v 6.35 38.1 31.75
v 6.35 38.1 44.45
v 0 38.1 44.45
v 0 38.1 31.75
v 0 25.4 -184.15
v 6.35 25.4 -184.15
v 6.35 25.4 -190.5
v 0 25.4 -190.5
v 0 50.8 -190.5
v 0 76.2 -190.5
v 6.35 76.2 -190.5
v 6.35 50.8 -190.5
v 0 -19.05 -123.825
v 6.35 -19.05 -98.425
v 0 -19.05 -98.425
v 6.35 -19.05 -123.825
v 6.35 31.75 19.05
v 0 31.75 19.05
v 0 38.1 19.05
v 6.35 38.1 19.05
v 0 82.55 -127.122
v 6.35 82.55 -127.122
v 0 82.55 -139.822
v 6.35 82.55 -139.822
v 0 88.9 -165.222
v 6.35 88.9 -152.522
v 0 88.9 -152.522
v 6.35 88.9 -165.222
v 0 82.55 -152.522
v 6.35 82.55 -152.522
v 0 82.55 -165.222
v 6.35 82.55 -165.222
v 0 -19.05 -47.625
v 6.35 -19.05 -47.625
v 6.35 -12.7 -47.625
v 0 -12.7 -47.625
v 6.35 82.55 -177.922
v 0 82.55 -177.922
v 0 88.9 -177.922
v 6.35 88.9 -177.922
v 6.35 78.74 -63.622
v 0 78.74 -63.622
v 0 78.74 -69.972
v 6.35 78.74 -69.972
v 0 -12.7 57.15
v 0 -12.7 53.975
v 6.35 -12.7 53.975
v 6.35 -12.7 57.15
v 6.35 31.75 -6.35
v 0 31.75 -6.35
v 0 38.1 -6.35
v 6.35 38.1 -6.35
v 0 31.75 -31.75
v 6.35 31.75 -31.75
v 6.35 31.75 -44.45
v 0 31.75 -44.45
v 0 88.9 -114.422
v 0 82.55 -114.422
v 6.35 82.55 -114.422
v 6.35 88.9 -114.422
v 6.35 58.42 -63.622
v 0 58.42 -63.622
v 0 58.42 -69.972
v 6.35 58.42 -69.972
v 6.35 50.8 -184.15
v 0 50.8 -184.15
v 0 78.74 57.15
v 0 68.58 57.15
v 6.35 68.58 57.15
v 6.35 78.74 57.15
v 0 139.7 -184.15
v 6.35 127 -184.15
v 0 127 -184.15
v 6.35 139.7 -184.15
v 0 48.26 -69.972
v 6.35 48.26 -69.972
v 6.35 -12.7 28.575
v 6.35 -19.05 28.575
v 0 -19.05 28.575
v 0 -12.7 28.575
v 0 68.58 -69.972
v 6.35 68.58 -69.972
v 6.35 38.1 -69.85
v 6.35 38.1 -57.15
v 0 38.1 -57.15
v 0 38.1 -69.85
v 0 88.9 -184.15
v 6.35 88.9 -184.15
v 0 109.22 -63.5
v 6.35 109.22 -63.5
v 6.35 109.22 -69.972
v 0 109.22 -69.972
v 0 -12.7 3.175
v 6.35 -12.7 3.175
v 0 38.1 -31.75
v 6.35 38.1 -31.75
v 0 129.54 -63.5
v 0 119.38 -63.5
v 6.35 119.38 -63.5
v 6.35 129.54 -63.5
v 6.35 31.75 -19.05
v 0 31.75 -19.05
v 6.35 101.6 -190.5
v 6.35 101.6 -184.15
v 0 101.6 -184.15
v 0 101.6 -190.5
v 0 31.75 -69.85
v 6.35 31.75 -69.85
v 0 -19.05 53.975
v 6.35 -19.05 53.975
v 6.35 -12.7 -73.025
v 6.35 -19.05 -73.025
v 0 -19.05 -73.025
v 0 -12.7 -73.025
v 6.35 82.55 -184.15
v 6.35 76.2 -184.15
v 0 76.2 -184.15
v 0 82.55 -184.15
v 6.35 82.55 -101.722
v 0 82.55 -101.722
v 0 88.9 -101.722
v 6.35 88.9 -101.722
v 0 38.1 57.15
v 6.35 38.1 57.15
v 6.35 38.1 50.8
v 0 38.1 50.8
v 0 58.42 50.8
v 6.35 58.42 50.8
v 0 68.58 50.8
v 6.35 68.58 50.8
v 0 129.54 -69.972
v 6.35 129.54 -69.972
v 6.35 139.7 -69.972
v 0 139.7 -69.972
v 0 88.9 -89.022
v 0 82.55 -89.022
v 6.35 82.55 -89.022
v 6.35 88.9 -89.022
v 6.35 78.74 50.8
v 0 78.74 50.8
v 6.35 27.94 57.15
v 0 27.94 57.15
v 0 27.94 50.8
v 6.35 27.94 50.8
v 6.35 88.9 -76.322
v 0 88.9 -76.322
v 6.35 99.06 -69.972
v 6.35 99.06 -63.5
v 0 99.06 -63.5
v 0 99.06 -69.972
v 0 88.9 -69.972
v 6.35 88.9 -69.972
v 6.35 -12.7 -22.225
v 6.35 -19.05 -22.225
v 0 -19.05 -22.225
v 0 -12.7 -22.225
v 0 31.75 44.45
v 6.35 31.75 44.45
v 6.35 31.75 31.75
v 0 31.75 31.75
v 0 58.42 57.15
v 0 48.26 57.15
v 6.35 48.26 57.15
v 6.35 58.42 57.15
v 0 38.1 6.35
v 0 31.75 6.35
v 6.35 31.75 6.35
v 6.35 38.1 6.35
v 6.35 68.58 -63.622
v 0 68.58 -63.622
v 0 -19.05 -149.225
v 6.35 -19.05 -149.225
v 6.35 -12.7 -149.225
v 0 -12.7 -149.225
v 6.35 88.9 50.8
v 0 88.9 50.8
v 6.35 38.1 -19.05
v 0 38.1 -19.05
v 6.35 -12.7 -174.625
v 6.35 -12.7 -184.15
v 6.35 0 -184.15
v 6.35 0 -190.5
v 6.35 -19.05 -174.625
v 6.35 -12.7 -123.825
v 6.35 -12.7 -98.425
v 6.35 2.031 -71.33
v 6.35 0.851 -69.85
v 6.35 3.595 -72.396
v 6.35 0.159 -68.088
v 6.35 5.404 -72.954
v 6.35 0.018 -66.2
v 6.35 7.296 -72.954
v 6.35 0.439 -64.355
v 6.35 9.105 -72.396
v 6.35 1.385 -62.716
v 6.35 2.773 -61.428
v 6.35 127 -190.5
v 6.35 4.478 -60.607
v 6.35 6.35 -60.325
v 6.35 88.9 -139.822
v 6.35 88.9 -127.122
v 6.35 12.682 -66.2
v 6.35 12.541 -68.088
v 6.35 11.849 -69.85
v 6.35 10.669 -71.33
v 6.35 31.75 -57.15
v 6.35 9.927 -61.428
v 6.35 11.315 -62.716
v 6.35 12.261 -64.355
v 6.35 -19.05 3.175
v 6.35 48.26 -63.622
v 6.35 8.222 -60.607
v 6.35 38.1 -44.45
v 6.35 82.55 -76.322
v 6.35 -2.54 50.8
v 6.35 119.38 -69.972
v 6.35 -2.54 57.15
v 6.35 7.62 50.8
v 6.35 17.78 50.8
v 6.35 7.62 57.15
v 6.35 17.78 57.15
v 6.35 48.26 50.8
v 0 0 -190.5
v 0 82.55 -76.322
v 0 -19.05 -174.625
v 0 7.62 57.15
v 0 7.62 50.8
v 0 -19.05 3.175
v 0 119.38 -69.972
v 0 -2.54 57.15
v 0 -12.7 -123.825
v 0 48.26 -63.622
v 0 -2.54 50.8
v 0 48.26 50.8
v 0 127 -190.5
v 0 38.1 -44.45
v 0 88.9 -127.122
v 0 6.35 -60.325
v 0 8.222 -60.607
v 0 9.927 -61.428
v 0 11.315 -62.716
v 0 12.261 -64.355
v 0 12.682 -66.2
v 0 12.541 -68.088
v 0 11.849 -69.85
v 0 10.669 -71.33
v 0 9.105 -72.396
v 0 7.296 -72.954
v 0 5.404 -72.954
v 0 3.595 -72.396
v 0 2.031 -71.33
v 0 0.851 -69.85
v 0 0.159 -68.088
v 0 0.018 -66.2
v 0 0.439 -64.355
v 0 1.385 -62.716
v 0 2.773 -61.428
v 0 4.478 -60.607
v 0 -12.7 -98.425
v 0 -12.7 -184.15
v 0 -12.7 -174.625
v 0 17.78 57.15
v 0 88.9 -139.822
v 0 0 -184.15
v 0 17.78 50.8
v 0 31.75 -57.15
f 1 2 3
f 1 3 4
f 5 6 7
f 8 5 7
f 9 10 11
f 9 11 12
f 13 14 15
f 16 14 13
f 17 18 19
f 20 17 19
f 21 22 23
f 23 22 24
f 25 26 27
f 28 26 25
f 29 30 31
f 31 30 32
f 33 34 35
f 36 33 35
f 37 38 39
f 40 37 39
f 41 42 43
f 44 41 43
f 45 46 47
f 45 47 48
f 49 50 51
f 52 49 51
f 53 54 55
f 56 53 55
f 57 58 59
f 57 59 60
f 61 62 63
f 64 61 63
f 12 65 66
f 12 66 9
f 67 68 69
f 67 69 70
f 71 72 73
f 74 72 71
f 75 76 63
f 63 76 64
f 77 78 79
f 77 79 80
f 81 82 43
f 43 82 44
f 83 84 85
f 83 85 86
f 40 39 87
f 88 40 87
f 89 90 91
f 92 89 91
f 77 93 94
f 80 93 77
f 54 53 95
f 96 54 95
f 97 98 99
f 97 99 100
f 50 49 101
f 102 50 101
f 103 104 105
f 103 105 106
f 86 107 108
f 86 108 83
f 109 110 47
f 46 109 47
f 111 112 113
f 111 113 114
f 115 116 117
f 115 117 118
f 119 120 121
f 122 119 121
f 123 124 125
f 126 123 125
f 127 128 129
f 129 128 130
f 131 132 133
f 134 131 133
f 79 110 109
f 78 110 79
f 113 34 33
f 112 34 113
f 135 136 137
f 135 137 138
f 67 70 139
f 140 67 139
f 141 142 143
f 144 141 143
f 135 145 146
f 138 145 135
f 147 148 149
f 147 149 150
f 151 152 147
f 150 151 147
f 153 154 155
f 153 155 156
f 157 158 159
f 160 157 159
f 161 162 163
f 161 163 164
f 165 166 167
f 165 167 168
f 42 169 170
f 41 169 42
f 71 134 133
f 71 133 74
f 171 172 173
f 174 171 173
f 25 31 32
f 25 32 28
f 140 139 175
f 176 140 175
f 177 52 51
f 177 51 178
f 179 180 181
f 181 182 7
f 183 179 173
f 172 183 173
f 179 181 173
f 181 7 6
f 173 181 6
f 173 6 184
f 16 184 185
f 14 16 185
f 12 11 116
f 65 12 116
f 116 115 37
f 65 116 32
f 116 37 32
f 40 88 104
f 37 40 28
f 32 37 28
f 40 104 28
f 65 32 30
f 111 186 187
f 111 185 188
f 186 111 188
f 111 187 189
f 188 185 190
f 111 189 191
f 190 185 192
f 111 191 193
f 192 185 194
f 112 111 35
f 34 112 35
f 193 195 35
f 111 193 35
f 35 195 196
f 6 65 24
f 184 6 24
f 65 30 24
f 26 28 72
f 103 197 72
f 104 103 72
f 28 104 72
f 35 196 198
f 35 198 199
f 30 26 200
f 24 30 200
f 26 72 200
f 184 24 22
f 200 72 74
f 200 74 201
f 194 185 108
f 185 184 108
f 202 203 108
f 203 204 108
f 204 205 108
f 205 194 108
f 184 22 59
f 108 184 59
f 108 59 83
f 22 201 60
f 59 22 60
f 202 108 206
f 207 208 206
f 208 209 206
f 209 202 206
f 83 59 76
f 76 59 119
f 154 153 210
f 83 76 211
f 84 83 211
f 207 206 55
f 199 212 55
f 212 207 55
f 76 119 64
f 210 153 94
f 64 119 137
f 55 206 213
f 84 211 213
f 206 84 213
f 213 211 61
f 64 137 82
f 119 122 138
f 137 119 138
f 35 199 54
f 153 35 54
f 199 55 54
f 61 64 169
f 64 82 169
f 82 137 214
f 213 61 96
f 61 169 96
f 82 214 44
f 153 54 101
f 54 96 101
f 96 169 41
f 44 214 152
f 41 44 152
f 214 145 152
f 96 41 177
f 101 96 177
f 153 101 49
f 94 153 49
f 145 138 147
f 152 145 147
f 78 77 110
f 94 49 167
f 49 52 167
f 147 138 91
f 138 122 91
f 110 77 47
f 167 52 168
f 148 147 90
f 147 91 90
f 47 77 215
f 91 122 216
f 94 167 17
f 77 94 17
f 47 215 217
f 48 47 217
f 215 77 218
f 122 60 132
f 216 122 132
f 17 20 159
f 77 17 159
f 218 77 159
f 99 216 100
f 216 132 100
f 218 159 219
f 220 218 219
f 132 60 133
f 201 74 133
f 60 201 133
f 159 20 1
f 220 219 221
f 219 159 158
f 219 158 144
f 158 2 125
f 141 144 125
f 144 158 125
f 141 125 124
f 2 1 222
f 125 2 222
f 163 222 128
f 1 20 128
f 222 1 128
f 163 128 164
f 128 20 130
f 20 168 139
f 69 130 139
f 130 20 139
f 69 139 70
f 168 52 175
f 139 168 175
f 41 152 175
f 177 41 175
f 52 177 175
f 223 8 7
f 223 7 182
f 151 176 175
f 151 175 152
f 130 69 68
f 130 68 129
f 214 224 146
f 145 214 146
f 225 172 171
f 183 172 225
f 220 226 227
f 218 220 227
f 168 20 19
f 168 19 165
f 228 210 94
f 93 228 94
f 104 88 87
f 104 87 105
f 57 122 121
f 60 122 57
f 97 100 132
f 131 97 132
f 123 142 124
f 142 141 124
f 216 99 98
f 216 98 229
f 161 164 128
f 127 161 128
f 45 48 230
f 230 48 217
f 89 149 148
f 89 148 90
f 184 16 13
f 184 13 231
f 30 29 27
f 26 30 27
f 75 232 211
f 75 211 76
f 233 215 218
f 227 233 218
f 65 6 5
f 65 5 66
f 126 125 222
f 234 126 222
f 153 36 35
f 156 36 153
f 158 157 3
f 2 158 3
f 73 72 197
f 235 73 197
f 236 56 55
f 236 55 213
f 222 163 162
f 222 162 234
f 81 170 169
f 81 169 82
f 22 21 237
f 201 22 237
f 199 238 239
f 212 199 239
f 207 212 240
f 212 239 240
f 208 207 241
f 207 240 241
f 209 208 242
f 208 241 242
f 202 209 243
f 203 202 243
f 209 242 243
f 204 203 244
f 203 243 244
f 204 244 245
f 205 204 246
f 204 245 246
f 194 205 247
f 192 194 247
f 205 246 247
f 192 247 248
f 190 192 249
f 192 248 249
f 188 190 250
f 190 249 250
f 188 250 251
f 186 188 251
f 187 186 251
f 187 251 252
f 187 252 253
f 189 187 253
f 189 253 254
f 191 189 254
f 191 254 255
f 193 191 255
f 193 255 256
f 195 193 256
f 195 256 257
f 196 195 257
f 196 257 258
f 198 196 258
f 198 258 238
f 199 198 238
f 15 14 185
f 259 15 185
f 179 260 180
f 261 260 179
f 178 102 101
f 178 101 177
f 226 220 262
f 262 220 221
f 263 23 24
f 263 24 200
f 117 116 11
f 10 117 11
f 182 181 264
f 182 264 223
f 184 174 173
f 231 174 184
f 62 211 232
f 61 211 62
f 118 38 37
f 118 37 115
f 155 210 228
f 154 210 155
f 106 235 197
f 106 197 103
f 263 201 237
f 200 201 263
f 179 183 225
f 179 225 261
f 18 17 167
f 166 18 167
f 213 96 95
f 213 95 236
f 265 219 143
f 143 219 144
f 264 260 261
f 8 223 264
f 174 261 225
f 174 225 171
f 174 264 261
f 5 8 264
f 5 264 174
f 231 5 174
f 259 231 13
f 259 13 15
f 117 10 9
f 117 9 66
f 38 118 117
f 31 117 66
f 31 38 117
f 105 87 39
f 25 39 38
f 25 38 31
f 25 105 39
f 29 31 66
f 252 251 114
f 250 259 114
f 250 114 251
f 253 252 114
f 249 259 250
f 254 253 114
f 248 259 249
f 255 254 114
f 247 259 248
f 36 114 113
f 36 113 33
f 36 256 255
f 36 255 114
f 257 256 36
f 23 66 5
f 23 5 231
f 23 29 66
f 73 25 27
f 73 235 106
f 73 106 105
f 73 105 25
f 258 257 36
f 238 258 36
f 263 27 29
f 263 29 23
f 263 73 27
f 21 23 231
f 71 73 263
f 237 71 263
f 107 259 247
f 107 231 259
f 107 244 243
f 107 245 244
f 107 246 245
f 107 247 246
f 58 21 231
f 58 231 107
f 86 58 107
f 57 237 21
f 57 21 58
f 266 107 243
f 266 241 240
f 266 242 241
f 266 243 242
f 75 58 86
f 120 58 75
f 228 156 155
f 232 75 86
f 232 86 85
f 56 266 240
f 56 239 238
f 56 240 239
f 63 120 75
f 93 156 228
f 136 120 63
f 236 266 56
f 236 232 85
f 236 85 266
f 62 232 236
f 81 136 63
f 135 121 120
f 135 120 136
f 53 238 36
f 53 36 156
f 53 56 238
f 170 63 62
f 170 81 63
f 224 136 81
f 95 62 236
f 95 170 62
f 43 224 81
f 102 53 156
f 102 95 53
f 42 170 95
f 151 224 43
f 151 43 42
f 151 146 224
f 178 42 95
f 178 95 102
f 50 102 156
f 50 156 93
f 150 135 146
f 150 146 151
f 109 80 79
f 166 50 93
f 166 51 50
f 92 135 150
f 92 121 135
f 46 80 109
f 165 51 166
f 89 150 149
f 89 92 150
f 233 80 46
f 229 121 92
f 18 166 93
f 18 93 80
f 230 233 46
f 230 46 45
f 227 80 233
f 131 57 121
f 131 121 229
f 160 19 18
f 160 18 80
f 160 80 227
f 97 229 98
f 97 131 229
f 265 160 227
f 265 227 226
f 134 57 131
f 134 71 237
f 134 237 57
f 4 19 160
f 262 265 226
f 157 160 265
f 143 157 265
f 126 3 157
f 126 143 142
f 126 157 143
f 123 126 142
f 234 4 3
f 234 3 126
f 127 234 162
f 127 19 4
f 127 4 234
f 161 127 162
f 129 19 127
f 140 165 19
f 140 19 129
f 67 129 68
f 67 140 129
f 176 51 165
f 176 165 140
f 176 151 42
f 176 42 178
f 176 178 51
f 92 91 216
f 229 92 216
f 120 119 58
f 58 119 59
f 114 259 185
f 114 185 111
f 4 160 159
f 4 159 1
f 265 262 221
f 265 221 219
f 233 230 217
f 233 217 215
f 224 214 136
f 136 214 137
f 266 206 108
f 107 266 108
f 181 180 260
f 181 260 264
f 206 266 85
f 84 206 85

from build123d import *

# Parameters (mm, degrees)
BOSS_EXTRU_1_DEPTH         = 6.35
ESQUISSE4_W                = 6.35
ESQUISSE4_H                = 10.16
ESQUISSE4_W_2              = 6.472054313
ENL_V_MAT_EXTRU_1_DEPTH    = 237.318984637
R_P_TITION_LIN_AIRE3_COUNT = 3
R_P_TITION_LIN_AIRE3_PITCH = 20.32
ESQUISSE6_W                = 25.4
ESQUISSE6_H                = 6.35
BOSS_EXTRU_3_DEPTH         = 6.35
R_P_TITION_LIN_AIRE4_COUNT = 7
R_P_TITION_LIN_AIRE4_PITCH = 50.8
ESQUISSE7_W                = 6.35
ESQUISSE7_H                = 10.16
ENL_V_MAT_EXTRU_2_DEPTH    = 6.35
ESQUISSE8_W                = 12.7
ESQUISSE8_H                = 6.35
ENL_V_MAT_EXTRU_3_DEPTH    = 6.35
R_P_TITION_LIN_AIRE6_COUNT = 5
R_P_TITION_LIN_AIRE6_PITCH = 25.4
ESQUISSE9_W                = 6.35
ESQUISSE9_H                = 25.4
ENL_V_MAT_EXTRU_4_DEPTH    = 6.35
R_P_TITION_LIN_AIRE7_COUNT = 3
R_P_TITION_LIN_AIRE7_PITCH = 50.8
ESQUISSE10_W               = 6.35
ESQUISSE10_H               = 12.7
ENL_V_MAT_EXTRU_5_DEPTH    = 6.35
SKETCH1_W                  = 120.65
SKETCH1_H                  = 57.15
CUT_EXTRUDE1_DEPTH         = 237.318984637
ENL_V_MAT_EXTRU_6_REACH    = 238.319
ESQUISSE11_R               = 6.35


with BuildPart() as part:
    # Esquisse1 → Boss.-Extru.1 (new body)
    with BuildSketch(Plane(origin=(0, 0, 0), x_dir=(0, 0, -1), z_dir=(1, 0, 0))):
        Polygon((-57.15, 38.1), (-57.15, 88.9), (63.5, 88.9), (63.5, 139.7), (190.5, 139.7), (190.5, -12.7), (-177.8, -12.7), (-177.8, 38.1), align=None)
    extrude(amount=BOSS_EXTRU_1_DEPTH)

    # Esquisse4 → Enlèv. mat.-Extru.1 (cut, through all)
    with BuildSketch(Plane(origin=(6.35, 0, 0), x_dir=(0, 0, -1), z_dir=(1, 0, 0))):
        with Locations((-174.625, -7.62)):
            Rectangle(ESQUISSE4_W, ESQUISSE4_H)
        with Locations((-53.975, 43.18)):
            Rectangle(ESQUISSE4_W, ESQUISSE4_H)
        with Locations((66.736027157, 93.98)):
            Rectangle(ESQUISSE4_W_2, ESQUISSE4_H)
    enl_v_mat_extru_1 = extrude(amount=-ENL_V_MAT_EXTRU_1_DEPTH, mode=Mode.SUBTRACT)

    # Répétition linéaire3: Enlèv. mat.-Extru.1 ×3
    with Locations(*[(0, i * R_P_TITION_LIN_AIRE3_PITCH, 0) for i in range(1, R_P_TITION_LIN_AIRE3_COUNT)]):
        add(enl_v_mat_extru_1, mode=Mode.SUBTRACT)

    # Esquisse6 → Boss.-Extru.3 (add)
    with BuildSketch(Plane(origin=(6.35, 0, 0), x_dir=(0, 0, -1), z_dir=(1, 0, 0))):
        with Locations((-142.875, -15.875)):
            Rectangle(ESQUISSE6_W, ESQUISSE6_H)
    boss_extru_3 = extrude(amount=-BOSS_EXTRU_3_DEPTH)

    # Répétition linéaire4: Boss.-Extru.3 ×7
    with Locations(*[(0, 0, -i * R_P_TITION_LIN_AIRE4_PITCH) for i in range(1, R_P_TITION_LIN_AIRE4_COUNT)]):
        add(boss_extru_3)

    # Esquisse7 → Enlèv. mat.-Extru.2 (cut)
    with BuildSketch(Plane(origin=(6.35, 0, 0), x_dir=(0, 0, -1), z_dir=(1, 0, 0))):
        with Locations((-53.975, 22.86)):
            Rectangle(ESQUISSE7_W, ESQUISSE7_H)
        with Locations((66.797054313, 73.66)):
            Rectangle(ESQUISSE7_W, ESQUISSE7_H)
        with Locations((-53.975, 2.54)):
            Rectangle(ESQUISSE7_W, ESQUISSE7_H)
        with Locations((66.797054313, 53.34)):
            Rectangle(ESQUISSE7_W, ESQUISSE7_H)
    extrude(amount=-ENL_V_MAT_EXTRU_2_DEPTH, mode=Mode.SUBTRACT)

    # Esquisse8 → Enlèv. mat.-Extru.3 (cut)
    with BuildSketch(Plane(origin=(6.35, 0, 0), x_dir=(0, 0, -1), z_dir=(1, 0, 0))):
        with Locations((-38.1, 34.925)):
            Rectangle(ESQUISSE8_W, ESQUISSE8_H)
        with Locations((82.672054313, 85.725)):
            Rectangle(ESQUISSE8_W, ESQUISSE8_H)
    enl_v_mat_extru_3 = extrude(amount=-ENL_V_MAT_EXTRU_3_DEPTH, mode=Mode.SUBTRACT)

    # Répétition linéaire6: Enlèv. mat.-Extru.3 ×5
    with Locations(*[(0, 0, -i * R_P_TITION_LIN_AIRE6_PITCH) for i in range(1, R_P_TITION_LIN_AIRE6_COUNT)]):
        add(enl_v_mat_extru_3, mode=Mode.SUBTRACT)

    # Esquisse9 → Enlèv. mat.-Extru.4 (cut)
    with BuildSketch(Plane(origin=(6.35, 0, 0), x_dir=(0, 0, -1), z_dir=(1, 0, 0))):
        with Locations((187.325, 88.9)):
            Rectangle(ESQUISSE9_W, ESQUISSE9_H)
    enl_v_mat_extru_4 = extrude(amount=-ENL_V_MAT_EXTRU_4_DEPTH, mode=Mode.SUBTRACT)

    # Répétition linéaire7: Enlèv. mat.-Extru.4 ×3
    with Locations(*[(0, -i * R_P_TITION_LIN_AIRE7_PITCH, 0) for i in range(1, R_P_TITION_LIN_AIRE7_COUNT)]):
        add(enl_v_mat_extru_4, mode=Mode.SUBTRACT)

    # Esquisse10 → Enlèv. mat.-Extru.5 (cut)
    with BuildSketch(Plane(origin=(6.35, 0, 0), x_dir=(0, 0, -1), z_dir=(1, 0, 0))):
        with Locations((187.325, 133.35)):
            Rectangle(ESQUISSE10_W, ESQUISSE10_H)
    extrude(amount=-ENL_V_MAT_EXTRU_5_DEPTH, mode=Mode.SUBTRACT)

    # Sketch1 → Cut-Extrude1 (cut, through all)
    with BuildSketch(Plane(origin=(6.35, 0, 0), x_dir=(0, 0, -1), z_dir=(1, 0, 0))):
        with Locations((-117.475, 9.525)):
            Rectangle(SKETCH1_W, SKETCH1_H)
    extrude(amount=-CUT_EXTRUDE1_DEPTH, mode=Mode.SUBTRACT)

    # Esquisse11 → Enlèv. mat.-Extru.6 (cut, up to next)
    with BuildSketch(Plane.ZY, mode=Mode.PRIVATE) as enl_v_mat_extru_6_sk1:
        with Locations((-66.675, 6.35)):
            Circle(ESQUISSE11_R)
    enl_v_mat_extru_6_tool1 = extrude(enl_v_mat_extru_6_sk1.sketch, amount=-ENL_V_MAT_EXTRU_6_REACH, mode=Mode.PRIVATE) & part.part
    add(enl_v_mat_extru_6_tool1.solids().sort_by_distance((0, 6.35, -66.675))[0], mode=Mode.SUBTRACT)


solid = part.part
